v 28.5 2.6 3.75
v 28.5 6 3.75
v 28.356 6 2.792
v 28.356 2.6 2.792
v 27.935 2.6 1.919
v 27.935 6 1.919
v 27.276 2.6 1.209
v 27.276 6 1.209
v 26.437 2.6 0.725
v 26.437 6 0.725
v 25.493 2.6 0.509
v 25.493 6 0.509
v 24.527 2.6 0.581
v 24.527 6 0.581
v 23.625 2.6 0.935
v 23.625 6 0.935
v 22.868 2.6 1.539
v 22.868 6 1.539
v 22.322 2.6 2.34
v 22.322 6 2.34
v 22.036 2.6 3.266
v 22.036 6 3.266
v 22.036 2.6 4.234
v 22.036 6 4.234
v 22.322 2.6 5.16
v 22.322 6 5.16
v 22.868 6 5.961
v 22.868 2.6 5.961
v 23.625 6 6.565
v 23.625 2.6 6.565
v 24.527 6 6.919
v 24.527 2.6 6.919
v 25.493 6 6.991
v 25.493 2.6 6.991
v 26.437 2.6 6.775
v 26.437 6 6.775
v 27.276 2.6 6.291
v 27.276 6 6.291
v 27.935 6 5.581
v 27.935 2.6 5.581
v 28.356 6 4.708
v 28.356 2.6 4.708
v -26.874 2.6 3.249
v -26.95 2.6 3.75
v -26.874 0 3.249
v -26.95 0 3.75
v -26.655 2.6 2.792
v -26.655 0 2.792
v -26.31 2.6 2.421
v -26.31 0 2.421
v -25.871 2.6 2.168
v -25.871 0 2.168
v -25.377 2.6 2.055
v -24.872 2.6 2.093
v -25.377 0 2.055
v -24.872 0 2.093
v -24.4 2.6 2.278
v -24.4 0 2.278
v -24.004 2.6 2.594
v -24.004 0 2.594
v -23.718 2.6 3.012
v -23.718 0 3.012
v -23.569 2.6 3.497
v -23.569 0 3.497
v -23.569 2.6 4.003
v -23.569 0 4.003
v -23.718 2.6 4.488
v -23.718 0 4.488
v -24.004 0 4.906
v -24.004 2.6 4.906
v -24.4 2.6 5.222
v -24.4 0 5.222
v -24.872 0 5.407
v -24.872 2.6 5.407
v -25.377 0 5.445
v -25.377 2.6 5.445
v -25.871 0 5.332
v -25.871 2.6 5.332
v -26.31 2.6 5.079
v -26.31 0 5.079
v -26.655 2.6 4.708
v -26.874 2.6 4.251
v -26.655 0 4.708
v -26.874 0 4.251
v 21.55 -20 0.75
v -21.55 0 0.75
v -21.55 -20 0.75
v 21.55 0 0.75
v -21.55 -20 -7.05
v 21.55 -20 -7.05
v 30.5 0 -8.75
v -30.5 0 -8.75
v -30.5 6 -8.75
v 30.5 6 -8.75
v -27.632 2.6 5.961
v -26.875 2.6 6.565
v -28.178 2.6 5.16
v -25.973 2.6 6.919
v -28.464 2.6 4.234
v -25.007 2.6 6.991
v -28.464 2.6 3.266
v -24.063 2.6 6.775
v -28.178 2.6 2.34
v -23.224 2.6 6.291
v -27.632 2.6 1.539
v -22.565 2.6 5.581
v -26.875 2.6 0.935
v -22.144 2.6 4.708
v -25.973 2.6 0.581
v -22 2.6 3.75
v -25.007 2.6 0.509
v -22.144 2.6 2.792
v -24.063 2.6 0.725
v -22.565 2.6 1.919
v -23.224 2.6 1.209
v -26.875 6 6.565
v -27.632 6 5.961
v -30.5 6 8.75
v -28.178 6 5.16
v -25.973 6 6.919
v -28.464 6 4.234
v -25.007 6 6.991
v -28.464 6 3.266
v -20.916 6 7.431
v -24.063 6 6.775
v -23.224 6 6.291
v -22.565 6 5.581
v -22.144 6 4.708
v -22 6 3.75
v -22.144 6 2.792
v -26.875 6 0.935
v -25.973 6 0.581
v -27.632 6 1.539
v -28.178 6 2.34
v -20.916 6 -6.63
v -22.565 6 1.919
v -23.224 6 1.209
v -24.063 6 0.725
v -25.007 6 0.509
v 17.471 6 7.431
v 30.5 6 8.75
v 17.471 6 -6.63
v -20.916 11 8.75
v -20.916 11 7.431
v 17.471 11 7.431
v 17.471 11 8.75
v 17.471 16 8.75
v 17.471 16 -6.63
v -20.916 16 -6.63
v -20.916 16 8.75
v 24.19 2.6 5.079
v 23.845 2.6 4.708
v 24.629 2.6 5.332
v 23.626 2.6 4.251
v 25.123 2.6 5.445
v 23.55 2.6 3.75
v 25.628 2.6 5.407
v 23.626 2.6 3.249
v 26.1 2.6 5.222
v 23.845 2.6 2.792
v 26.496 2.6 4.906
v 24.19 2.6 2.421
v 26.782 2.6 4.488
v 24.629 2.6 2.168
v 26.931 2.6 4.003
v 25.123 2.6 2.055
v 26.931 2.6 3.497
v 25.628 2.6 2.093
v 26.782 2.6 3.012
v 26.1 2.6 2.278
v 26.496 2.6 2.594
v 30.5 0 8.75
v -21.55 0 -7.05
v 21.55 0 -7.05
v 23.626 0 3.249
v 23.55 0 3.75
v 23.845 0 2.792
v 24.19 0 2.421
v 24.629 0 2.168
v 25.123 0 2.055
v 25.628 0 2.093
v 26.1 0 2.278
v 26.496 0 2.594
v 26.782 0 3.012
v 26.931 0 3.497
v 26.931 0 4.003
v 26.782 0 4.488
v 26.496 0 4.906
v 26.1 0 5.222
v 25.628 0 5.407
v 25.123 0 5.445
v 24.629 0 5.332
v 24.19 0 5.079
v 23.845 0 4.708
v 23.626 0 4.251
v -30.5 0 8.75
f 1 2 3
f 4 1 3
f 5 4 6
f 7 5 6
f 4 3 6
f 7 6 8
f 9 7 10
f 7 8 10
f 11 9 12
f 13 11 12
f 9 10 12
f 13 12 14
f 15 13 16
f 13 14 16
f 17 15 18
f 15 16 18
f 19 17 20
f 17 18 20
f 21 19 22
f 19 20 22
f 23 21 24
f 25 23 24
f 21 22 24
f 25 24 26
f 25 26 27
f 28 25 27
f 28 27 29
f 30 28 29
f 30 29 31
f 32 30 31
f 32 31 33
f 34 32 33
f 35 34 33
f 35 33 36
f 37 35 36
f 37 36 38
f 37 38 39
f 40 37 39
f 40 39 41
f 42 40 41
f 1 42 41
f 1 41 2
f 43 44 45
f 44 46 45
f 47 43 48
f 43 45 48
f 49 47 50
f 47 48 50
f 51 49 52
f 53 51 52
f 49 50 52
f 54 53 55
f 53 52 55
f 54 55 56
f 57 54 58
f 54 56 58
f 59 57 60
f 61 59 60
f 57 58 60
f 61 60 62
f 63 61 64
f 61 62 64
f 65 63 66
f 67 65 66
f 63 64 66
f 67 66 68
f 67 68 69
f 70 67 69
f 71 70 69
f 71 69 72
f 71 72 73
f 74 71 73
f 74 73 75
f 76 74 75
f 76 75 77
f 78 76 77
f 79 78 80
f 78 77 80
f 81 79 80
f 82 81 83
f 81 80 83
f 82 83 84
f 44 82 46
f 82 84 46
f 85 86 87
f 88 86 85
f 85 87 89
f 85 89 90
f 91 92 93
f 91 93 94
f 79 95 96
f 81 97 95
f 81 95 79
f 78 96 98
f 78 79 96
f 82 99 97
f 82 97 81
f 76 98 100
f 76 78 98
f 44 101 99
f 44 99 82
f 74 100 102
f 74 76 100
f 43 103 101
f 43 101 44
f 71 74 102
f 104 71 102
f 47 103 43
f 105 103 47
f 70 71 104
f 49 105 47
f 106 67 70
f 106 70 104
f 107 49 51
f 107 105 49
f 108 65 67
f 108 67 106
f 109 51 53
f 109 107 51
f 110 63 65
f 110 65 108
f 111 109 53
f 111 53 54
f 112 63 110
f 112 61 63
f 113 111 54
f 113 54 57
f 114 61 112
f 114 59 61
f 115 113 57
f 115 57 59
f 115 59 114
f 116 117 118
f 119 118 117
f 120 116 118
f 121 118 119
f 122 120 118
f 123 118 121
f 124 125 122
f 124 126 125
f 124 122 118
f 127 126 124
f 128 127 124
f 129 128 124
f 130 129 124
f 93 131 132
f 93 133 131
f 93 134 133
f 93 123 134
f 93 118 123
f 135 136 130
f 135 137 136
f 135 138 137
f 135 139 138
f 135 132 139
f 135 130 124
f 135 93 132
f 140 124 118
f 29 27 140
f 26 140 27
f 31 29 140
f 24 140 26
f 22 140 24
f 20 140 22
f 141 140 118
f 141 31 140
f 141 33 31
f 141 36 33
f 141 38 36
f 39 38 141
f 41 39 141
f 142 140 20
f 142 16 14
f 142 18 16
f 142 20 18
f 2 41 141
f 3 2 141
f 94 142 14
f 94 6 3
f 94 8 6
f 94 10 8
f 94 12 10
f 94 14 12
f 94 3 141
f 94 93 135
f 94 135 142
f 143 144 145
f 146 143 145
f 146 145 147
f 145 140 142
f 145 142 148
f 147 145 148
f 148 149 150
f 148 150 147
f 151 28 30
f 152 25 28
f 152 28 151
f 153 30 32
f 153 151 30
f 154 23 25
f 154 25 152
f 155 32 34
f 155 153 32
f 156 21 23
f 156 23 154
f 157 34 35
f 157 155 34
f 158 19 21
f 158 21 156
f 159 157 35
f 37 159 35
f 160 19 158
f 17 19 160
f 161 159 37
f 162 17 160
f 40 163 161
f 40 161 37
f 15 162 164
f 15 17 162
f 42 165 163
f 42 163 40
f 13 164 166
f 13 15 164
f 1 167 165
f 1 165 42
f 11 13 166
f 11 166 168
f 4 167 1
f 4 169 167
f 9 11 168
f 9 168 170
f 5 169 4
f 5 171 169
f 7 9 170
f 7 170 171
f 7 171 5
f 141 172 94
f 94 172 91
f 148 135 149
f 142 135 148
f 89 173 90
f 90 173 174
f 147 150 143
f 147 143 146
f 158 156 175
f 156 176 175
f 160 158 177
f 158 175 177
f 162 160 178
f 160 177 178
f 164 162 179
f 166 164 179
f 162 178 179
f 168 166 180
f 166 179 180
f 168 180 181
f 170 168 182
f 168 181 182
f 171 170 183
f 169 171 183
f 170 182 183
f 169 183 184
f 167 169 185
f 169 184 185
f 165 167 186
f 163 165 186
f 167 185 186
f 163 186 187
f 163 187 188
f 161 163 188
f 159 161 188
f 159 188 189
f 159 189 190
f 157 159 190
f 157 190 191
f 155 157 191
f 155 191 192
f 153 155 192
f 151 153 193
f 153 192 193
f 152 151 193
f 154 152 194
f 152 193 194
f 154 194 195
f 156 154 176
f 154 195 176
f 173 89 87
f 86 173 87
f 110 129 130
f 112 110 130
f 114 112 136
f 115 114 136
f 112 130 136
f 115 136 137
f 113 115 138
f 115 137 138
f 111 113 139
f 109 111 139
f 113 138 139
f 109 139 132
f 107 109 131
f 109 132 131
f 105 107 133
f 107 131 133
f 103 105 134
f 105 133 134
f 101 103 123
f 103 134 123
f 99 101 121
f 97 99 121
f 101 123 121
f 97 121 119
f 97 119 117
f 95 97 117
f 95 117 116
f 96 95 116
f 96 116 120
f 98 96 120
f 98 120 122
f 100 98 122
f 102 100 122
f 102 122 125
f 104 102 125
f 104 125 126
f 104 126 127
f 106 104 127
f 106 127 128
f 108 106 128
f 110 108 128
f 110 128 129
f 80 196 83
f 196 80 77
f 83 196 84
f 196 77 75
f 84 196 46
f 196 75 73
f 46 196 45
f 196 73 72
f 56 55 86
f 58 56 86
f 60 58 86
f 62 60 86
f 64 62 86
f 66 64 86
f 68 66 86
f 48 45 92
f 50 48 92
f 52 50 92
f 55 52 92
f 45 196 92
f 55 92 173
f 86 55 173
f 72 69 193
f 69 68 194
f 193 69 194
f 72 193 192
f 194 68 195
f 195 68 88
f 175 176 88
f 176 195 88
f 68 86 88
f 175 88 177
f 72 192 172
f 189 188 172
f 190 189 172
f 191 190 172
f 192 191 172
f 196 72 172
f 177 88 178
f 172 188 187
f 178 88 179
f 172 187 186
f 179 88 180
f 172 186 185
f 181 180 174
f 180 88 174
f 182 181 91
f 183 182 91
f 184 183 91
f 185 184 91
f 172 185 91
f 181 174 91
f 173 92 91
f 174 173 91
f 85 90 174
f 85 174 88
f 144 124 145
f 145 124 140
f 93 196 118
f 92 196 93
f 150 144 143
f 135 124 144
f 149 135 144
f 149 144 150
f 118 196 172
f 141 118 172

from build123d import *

# Parameters (mm, degrees)
SKICA1_W                                         = 61
SKICA1_H                                         = 17.5
P_IDAT_VYSUNUT_M1_DEPTH                          = 6
SKICA2_W                                         = 43.1
SKICA2_H                                         = 7.8
P_IDAT_VYSUNUT_M2_DEPTH                          = 20
V_LCOV_ZAHLOUBEN_PRO_M3_ROUBY_S_VNIT_D           = 3.4
V_LCOV_ZAHLOUBEN_PRO_M3_ROUBY_S_VNIT_DEPTH       = 10
V_LCOV_ZAHLOUBEN_PRO_M3_ROUBY_S_VNIT_CBORE_D     = 6.5
V_LCOV_ZAHLOUBEN_PRO_M3_ROUBY_S_VNIT_CBORE_DEPTH = 3.4
V_LCOV_ZAHLOUBEN_PRO_M3_ROUBY_S_VNIT_TIP         = 1.021463052
SKICA5_W                                         = 38.387641765
SKICA5_H                                         = 14.060547141
P_IDAT_VYSUNUT_M3_DEPTH                          = 10
SKICA6_W                                         = 38.387641765
SKICA6_H                                         = 5
P_IDAT_VYSUNUT_M4_DEPTH                          = 1.319108231


with BuildPart() as part:
    # Skica1 → Přidat vysunutím1 (new body)
    with BuildSketch(Plane(origin=(0, 0, 0), x_dir=(1, 0, 0), z_dir=(0, 1, 0))):
        Rectangle(SKICA1_W, SKICA1_H)
    extrude(amount=P_IDAT_VYSUNUT_M1_DEPTH)

    # Skica2 → Přidat vysunutím2 (add)
    with BuildSketch(Plane.XZ):
        with Locations((0, -3.15)):
            Rectangle(SKICA2_W, SKICA2_H)
    extrude(amount=P_IDAT_VYSUNUT_M2_DEPTH)

    # Válcové zahloubení pro M3 šrouby s vnitřním šestihranem1
    with Locations(Plane(origin=(0, 6, 0), x_dir=(1, 0, 0), z_dir=(0, 1, 0))):
        with Locations((-25.25, -3.75), (25.25, -3.75)):
            CounterBoreHole(V_LCOV_ZAHLOUBEN_PRO_M3_ROUBY_S_VNIT_D / 2, V_LCOV_ZAHLOUBEN_PRO_M3_ROUBY_S_VNIT_CBORE_D / 2, V_LCOV_ZAHLOUBEN_PRO_M3_ROUBY_S_VNIT_CBORE_DEPTH, depth=V_LCOV_ZAHLOUBEN_PRO_M3_ROUBY_S_VNIT_DEPTH)
            with Locations((0, 0, -(V_LCOV_ZAHLOUBEN_PRO_M3_ROUBY_S_VNIT_DEPTH + V_LCOV_ZAHLOUBEN_PRO_M3_ROUBY_S_VNIT_TIP / 2))):  # 118° drill point
                Cone(0, V_LCOV_ZAHLOUBEN_PRO_M3_ROUBY_S_VNIT_D / 2, V_LCOV_ZAHLOUBEN_PRO_M3_ROUBY_S_VNIT_TIP, mode=Mode.SUBTRACT)

    # Skica5 → Přidat vysunutím3 (add)
    with BuildSketch(Plane(origin=(0, 6, 0), x_dir=(1, 0, 0), z_dir=(0, 1, 0))):
        with Locations((-1.722409319, -0.400618199)):
            Rectangle(SKICA5_W, SKICA5_H)
    extrude(amount=P_IDAT_VYSUNUT_M3_DEPTH)

    # Skica6 → Přidat vysunutím4 (add)
    with BuildSketch(Plane.XY.offset(7.430891769)):
        with Locations((-1.722409319, 13.5)):
            Rectangle(SKICA6_W, SKICA6_H)
    extrude(amount=P_IDAT_VYSUNUT_M4_DEPTH)


solid = part.part
